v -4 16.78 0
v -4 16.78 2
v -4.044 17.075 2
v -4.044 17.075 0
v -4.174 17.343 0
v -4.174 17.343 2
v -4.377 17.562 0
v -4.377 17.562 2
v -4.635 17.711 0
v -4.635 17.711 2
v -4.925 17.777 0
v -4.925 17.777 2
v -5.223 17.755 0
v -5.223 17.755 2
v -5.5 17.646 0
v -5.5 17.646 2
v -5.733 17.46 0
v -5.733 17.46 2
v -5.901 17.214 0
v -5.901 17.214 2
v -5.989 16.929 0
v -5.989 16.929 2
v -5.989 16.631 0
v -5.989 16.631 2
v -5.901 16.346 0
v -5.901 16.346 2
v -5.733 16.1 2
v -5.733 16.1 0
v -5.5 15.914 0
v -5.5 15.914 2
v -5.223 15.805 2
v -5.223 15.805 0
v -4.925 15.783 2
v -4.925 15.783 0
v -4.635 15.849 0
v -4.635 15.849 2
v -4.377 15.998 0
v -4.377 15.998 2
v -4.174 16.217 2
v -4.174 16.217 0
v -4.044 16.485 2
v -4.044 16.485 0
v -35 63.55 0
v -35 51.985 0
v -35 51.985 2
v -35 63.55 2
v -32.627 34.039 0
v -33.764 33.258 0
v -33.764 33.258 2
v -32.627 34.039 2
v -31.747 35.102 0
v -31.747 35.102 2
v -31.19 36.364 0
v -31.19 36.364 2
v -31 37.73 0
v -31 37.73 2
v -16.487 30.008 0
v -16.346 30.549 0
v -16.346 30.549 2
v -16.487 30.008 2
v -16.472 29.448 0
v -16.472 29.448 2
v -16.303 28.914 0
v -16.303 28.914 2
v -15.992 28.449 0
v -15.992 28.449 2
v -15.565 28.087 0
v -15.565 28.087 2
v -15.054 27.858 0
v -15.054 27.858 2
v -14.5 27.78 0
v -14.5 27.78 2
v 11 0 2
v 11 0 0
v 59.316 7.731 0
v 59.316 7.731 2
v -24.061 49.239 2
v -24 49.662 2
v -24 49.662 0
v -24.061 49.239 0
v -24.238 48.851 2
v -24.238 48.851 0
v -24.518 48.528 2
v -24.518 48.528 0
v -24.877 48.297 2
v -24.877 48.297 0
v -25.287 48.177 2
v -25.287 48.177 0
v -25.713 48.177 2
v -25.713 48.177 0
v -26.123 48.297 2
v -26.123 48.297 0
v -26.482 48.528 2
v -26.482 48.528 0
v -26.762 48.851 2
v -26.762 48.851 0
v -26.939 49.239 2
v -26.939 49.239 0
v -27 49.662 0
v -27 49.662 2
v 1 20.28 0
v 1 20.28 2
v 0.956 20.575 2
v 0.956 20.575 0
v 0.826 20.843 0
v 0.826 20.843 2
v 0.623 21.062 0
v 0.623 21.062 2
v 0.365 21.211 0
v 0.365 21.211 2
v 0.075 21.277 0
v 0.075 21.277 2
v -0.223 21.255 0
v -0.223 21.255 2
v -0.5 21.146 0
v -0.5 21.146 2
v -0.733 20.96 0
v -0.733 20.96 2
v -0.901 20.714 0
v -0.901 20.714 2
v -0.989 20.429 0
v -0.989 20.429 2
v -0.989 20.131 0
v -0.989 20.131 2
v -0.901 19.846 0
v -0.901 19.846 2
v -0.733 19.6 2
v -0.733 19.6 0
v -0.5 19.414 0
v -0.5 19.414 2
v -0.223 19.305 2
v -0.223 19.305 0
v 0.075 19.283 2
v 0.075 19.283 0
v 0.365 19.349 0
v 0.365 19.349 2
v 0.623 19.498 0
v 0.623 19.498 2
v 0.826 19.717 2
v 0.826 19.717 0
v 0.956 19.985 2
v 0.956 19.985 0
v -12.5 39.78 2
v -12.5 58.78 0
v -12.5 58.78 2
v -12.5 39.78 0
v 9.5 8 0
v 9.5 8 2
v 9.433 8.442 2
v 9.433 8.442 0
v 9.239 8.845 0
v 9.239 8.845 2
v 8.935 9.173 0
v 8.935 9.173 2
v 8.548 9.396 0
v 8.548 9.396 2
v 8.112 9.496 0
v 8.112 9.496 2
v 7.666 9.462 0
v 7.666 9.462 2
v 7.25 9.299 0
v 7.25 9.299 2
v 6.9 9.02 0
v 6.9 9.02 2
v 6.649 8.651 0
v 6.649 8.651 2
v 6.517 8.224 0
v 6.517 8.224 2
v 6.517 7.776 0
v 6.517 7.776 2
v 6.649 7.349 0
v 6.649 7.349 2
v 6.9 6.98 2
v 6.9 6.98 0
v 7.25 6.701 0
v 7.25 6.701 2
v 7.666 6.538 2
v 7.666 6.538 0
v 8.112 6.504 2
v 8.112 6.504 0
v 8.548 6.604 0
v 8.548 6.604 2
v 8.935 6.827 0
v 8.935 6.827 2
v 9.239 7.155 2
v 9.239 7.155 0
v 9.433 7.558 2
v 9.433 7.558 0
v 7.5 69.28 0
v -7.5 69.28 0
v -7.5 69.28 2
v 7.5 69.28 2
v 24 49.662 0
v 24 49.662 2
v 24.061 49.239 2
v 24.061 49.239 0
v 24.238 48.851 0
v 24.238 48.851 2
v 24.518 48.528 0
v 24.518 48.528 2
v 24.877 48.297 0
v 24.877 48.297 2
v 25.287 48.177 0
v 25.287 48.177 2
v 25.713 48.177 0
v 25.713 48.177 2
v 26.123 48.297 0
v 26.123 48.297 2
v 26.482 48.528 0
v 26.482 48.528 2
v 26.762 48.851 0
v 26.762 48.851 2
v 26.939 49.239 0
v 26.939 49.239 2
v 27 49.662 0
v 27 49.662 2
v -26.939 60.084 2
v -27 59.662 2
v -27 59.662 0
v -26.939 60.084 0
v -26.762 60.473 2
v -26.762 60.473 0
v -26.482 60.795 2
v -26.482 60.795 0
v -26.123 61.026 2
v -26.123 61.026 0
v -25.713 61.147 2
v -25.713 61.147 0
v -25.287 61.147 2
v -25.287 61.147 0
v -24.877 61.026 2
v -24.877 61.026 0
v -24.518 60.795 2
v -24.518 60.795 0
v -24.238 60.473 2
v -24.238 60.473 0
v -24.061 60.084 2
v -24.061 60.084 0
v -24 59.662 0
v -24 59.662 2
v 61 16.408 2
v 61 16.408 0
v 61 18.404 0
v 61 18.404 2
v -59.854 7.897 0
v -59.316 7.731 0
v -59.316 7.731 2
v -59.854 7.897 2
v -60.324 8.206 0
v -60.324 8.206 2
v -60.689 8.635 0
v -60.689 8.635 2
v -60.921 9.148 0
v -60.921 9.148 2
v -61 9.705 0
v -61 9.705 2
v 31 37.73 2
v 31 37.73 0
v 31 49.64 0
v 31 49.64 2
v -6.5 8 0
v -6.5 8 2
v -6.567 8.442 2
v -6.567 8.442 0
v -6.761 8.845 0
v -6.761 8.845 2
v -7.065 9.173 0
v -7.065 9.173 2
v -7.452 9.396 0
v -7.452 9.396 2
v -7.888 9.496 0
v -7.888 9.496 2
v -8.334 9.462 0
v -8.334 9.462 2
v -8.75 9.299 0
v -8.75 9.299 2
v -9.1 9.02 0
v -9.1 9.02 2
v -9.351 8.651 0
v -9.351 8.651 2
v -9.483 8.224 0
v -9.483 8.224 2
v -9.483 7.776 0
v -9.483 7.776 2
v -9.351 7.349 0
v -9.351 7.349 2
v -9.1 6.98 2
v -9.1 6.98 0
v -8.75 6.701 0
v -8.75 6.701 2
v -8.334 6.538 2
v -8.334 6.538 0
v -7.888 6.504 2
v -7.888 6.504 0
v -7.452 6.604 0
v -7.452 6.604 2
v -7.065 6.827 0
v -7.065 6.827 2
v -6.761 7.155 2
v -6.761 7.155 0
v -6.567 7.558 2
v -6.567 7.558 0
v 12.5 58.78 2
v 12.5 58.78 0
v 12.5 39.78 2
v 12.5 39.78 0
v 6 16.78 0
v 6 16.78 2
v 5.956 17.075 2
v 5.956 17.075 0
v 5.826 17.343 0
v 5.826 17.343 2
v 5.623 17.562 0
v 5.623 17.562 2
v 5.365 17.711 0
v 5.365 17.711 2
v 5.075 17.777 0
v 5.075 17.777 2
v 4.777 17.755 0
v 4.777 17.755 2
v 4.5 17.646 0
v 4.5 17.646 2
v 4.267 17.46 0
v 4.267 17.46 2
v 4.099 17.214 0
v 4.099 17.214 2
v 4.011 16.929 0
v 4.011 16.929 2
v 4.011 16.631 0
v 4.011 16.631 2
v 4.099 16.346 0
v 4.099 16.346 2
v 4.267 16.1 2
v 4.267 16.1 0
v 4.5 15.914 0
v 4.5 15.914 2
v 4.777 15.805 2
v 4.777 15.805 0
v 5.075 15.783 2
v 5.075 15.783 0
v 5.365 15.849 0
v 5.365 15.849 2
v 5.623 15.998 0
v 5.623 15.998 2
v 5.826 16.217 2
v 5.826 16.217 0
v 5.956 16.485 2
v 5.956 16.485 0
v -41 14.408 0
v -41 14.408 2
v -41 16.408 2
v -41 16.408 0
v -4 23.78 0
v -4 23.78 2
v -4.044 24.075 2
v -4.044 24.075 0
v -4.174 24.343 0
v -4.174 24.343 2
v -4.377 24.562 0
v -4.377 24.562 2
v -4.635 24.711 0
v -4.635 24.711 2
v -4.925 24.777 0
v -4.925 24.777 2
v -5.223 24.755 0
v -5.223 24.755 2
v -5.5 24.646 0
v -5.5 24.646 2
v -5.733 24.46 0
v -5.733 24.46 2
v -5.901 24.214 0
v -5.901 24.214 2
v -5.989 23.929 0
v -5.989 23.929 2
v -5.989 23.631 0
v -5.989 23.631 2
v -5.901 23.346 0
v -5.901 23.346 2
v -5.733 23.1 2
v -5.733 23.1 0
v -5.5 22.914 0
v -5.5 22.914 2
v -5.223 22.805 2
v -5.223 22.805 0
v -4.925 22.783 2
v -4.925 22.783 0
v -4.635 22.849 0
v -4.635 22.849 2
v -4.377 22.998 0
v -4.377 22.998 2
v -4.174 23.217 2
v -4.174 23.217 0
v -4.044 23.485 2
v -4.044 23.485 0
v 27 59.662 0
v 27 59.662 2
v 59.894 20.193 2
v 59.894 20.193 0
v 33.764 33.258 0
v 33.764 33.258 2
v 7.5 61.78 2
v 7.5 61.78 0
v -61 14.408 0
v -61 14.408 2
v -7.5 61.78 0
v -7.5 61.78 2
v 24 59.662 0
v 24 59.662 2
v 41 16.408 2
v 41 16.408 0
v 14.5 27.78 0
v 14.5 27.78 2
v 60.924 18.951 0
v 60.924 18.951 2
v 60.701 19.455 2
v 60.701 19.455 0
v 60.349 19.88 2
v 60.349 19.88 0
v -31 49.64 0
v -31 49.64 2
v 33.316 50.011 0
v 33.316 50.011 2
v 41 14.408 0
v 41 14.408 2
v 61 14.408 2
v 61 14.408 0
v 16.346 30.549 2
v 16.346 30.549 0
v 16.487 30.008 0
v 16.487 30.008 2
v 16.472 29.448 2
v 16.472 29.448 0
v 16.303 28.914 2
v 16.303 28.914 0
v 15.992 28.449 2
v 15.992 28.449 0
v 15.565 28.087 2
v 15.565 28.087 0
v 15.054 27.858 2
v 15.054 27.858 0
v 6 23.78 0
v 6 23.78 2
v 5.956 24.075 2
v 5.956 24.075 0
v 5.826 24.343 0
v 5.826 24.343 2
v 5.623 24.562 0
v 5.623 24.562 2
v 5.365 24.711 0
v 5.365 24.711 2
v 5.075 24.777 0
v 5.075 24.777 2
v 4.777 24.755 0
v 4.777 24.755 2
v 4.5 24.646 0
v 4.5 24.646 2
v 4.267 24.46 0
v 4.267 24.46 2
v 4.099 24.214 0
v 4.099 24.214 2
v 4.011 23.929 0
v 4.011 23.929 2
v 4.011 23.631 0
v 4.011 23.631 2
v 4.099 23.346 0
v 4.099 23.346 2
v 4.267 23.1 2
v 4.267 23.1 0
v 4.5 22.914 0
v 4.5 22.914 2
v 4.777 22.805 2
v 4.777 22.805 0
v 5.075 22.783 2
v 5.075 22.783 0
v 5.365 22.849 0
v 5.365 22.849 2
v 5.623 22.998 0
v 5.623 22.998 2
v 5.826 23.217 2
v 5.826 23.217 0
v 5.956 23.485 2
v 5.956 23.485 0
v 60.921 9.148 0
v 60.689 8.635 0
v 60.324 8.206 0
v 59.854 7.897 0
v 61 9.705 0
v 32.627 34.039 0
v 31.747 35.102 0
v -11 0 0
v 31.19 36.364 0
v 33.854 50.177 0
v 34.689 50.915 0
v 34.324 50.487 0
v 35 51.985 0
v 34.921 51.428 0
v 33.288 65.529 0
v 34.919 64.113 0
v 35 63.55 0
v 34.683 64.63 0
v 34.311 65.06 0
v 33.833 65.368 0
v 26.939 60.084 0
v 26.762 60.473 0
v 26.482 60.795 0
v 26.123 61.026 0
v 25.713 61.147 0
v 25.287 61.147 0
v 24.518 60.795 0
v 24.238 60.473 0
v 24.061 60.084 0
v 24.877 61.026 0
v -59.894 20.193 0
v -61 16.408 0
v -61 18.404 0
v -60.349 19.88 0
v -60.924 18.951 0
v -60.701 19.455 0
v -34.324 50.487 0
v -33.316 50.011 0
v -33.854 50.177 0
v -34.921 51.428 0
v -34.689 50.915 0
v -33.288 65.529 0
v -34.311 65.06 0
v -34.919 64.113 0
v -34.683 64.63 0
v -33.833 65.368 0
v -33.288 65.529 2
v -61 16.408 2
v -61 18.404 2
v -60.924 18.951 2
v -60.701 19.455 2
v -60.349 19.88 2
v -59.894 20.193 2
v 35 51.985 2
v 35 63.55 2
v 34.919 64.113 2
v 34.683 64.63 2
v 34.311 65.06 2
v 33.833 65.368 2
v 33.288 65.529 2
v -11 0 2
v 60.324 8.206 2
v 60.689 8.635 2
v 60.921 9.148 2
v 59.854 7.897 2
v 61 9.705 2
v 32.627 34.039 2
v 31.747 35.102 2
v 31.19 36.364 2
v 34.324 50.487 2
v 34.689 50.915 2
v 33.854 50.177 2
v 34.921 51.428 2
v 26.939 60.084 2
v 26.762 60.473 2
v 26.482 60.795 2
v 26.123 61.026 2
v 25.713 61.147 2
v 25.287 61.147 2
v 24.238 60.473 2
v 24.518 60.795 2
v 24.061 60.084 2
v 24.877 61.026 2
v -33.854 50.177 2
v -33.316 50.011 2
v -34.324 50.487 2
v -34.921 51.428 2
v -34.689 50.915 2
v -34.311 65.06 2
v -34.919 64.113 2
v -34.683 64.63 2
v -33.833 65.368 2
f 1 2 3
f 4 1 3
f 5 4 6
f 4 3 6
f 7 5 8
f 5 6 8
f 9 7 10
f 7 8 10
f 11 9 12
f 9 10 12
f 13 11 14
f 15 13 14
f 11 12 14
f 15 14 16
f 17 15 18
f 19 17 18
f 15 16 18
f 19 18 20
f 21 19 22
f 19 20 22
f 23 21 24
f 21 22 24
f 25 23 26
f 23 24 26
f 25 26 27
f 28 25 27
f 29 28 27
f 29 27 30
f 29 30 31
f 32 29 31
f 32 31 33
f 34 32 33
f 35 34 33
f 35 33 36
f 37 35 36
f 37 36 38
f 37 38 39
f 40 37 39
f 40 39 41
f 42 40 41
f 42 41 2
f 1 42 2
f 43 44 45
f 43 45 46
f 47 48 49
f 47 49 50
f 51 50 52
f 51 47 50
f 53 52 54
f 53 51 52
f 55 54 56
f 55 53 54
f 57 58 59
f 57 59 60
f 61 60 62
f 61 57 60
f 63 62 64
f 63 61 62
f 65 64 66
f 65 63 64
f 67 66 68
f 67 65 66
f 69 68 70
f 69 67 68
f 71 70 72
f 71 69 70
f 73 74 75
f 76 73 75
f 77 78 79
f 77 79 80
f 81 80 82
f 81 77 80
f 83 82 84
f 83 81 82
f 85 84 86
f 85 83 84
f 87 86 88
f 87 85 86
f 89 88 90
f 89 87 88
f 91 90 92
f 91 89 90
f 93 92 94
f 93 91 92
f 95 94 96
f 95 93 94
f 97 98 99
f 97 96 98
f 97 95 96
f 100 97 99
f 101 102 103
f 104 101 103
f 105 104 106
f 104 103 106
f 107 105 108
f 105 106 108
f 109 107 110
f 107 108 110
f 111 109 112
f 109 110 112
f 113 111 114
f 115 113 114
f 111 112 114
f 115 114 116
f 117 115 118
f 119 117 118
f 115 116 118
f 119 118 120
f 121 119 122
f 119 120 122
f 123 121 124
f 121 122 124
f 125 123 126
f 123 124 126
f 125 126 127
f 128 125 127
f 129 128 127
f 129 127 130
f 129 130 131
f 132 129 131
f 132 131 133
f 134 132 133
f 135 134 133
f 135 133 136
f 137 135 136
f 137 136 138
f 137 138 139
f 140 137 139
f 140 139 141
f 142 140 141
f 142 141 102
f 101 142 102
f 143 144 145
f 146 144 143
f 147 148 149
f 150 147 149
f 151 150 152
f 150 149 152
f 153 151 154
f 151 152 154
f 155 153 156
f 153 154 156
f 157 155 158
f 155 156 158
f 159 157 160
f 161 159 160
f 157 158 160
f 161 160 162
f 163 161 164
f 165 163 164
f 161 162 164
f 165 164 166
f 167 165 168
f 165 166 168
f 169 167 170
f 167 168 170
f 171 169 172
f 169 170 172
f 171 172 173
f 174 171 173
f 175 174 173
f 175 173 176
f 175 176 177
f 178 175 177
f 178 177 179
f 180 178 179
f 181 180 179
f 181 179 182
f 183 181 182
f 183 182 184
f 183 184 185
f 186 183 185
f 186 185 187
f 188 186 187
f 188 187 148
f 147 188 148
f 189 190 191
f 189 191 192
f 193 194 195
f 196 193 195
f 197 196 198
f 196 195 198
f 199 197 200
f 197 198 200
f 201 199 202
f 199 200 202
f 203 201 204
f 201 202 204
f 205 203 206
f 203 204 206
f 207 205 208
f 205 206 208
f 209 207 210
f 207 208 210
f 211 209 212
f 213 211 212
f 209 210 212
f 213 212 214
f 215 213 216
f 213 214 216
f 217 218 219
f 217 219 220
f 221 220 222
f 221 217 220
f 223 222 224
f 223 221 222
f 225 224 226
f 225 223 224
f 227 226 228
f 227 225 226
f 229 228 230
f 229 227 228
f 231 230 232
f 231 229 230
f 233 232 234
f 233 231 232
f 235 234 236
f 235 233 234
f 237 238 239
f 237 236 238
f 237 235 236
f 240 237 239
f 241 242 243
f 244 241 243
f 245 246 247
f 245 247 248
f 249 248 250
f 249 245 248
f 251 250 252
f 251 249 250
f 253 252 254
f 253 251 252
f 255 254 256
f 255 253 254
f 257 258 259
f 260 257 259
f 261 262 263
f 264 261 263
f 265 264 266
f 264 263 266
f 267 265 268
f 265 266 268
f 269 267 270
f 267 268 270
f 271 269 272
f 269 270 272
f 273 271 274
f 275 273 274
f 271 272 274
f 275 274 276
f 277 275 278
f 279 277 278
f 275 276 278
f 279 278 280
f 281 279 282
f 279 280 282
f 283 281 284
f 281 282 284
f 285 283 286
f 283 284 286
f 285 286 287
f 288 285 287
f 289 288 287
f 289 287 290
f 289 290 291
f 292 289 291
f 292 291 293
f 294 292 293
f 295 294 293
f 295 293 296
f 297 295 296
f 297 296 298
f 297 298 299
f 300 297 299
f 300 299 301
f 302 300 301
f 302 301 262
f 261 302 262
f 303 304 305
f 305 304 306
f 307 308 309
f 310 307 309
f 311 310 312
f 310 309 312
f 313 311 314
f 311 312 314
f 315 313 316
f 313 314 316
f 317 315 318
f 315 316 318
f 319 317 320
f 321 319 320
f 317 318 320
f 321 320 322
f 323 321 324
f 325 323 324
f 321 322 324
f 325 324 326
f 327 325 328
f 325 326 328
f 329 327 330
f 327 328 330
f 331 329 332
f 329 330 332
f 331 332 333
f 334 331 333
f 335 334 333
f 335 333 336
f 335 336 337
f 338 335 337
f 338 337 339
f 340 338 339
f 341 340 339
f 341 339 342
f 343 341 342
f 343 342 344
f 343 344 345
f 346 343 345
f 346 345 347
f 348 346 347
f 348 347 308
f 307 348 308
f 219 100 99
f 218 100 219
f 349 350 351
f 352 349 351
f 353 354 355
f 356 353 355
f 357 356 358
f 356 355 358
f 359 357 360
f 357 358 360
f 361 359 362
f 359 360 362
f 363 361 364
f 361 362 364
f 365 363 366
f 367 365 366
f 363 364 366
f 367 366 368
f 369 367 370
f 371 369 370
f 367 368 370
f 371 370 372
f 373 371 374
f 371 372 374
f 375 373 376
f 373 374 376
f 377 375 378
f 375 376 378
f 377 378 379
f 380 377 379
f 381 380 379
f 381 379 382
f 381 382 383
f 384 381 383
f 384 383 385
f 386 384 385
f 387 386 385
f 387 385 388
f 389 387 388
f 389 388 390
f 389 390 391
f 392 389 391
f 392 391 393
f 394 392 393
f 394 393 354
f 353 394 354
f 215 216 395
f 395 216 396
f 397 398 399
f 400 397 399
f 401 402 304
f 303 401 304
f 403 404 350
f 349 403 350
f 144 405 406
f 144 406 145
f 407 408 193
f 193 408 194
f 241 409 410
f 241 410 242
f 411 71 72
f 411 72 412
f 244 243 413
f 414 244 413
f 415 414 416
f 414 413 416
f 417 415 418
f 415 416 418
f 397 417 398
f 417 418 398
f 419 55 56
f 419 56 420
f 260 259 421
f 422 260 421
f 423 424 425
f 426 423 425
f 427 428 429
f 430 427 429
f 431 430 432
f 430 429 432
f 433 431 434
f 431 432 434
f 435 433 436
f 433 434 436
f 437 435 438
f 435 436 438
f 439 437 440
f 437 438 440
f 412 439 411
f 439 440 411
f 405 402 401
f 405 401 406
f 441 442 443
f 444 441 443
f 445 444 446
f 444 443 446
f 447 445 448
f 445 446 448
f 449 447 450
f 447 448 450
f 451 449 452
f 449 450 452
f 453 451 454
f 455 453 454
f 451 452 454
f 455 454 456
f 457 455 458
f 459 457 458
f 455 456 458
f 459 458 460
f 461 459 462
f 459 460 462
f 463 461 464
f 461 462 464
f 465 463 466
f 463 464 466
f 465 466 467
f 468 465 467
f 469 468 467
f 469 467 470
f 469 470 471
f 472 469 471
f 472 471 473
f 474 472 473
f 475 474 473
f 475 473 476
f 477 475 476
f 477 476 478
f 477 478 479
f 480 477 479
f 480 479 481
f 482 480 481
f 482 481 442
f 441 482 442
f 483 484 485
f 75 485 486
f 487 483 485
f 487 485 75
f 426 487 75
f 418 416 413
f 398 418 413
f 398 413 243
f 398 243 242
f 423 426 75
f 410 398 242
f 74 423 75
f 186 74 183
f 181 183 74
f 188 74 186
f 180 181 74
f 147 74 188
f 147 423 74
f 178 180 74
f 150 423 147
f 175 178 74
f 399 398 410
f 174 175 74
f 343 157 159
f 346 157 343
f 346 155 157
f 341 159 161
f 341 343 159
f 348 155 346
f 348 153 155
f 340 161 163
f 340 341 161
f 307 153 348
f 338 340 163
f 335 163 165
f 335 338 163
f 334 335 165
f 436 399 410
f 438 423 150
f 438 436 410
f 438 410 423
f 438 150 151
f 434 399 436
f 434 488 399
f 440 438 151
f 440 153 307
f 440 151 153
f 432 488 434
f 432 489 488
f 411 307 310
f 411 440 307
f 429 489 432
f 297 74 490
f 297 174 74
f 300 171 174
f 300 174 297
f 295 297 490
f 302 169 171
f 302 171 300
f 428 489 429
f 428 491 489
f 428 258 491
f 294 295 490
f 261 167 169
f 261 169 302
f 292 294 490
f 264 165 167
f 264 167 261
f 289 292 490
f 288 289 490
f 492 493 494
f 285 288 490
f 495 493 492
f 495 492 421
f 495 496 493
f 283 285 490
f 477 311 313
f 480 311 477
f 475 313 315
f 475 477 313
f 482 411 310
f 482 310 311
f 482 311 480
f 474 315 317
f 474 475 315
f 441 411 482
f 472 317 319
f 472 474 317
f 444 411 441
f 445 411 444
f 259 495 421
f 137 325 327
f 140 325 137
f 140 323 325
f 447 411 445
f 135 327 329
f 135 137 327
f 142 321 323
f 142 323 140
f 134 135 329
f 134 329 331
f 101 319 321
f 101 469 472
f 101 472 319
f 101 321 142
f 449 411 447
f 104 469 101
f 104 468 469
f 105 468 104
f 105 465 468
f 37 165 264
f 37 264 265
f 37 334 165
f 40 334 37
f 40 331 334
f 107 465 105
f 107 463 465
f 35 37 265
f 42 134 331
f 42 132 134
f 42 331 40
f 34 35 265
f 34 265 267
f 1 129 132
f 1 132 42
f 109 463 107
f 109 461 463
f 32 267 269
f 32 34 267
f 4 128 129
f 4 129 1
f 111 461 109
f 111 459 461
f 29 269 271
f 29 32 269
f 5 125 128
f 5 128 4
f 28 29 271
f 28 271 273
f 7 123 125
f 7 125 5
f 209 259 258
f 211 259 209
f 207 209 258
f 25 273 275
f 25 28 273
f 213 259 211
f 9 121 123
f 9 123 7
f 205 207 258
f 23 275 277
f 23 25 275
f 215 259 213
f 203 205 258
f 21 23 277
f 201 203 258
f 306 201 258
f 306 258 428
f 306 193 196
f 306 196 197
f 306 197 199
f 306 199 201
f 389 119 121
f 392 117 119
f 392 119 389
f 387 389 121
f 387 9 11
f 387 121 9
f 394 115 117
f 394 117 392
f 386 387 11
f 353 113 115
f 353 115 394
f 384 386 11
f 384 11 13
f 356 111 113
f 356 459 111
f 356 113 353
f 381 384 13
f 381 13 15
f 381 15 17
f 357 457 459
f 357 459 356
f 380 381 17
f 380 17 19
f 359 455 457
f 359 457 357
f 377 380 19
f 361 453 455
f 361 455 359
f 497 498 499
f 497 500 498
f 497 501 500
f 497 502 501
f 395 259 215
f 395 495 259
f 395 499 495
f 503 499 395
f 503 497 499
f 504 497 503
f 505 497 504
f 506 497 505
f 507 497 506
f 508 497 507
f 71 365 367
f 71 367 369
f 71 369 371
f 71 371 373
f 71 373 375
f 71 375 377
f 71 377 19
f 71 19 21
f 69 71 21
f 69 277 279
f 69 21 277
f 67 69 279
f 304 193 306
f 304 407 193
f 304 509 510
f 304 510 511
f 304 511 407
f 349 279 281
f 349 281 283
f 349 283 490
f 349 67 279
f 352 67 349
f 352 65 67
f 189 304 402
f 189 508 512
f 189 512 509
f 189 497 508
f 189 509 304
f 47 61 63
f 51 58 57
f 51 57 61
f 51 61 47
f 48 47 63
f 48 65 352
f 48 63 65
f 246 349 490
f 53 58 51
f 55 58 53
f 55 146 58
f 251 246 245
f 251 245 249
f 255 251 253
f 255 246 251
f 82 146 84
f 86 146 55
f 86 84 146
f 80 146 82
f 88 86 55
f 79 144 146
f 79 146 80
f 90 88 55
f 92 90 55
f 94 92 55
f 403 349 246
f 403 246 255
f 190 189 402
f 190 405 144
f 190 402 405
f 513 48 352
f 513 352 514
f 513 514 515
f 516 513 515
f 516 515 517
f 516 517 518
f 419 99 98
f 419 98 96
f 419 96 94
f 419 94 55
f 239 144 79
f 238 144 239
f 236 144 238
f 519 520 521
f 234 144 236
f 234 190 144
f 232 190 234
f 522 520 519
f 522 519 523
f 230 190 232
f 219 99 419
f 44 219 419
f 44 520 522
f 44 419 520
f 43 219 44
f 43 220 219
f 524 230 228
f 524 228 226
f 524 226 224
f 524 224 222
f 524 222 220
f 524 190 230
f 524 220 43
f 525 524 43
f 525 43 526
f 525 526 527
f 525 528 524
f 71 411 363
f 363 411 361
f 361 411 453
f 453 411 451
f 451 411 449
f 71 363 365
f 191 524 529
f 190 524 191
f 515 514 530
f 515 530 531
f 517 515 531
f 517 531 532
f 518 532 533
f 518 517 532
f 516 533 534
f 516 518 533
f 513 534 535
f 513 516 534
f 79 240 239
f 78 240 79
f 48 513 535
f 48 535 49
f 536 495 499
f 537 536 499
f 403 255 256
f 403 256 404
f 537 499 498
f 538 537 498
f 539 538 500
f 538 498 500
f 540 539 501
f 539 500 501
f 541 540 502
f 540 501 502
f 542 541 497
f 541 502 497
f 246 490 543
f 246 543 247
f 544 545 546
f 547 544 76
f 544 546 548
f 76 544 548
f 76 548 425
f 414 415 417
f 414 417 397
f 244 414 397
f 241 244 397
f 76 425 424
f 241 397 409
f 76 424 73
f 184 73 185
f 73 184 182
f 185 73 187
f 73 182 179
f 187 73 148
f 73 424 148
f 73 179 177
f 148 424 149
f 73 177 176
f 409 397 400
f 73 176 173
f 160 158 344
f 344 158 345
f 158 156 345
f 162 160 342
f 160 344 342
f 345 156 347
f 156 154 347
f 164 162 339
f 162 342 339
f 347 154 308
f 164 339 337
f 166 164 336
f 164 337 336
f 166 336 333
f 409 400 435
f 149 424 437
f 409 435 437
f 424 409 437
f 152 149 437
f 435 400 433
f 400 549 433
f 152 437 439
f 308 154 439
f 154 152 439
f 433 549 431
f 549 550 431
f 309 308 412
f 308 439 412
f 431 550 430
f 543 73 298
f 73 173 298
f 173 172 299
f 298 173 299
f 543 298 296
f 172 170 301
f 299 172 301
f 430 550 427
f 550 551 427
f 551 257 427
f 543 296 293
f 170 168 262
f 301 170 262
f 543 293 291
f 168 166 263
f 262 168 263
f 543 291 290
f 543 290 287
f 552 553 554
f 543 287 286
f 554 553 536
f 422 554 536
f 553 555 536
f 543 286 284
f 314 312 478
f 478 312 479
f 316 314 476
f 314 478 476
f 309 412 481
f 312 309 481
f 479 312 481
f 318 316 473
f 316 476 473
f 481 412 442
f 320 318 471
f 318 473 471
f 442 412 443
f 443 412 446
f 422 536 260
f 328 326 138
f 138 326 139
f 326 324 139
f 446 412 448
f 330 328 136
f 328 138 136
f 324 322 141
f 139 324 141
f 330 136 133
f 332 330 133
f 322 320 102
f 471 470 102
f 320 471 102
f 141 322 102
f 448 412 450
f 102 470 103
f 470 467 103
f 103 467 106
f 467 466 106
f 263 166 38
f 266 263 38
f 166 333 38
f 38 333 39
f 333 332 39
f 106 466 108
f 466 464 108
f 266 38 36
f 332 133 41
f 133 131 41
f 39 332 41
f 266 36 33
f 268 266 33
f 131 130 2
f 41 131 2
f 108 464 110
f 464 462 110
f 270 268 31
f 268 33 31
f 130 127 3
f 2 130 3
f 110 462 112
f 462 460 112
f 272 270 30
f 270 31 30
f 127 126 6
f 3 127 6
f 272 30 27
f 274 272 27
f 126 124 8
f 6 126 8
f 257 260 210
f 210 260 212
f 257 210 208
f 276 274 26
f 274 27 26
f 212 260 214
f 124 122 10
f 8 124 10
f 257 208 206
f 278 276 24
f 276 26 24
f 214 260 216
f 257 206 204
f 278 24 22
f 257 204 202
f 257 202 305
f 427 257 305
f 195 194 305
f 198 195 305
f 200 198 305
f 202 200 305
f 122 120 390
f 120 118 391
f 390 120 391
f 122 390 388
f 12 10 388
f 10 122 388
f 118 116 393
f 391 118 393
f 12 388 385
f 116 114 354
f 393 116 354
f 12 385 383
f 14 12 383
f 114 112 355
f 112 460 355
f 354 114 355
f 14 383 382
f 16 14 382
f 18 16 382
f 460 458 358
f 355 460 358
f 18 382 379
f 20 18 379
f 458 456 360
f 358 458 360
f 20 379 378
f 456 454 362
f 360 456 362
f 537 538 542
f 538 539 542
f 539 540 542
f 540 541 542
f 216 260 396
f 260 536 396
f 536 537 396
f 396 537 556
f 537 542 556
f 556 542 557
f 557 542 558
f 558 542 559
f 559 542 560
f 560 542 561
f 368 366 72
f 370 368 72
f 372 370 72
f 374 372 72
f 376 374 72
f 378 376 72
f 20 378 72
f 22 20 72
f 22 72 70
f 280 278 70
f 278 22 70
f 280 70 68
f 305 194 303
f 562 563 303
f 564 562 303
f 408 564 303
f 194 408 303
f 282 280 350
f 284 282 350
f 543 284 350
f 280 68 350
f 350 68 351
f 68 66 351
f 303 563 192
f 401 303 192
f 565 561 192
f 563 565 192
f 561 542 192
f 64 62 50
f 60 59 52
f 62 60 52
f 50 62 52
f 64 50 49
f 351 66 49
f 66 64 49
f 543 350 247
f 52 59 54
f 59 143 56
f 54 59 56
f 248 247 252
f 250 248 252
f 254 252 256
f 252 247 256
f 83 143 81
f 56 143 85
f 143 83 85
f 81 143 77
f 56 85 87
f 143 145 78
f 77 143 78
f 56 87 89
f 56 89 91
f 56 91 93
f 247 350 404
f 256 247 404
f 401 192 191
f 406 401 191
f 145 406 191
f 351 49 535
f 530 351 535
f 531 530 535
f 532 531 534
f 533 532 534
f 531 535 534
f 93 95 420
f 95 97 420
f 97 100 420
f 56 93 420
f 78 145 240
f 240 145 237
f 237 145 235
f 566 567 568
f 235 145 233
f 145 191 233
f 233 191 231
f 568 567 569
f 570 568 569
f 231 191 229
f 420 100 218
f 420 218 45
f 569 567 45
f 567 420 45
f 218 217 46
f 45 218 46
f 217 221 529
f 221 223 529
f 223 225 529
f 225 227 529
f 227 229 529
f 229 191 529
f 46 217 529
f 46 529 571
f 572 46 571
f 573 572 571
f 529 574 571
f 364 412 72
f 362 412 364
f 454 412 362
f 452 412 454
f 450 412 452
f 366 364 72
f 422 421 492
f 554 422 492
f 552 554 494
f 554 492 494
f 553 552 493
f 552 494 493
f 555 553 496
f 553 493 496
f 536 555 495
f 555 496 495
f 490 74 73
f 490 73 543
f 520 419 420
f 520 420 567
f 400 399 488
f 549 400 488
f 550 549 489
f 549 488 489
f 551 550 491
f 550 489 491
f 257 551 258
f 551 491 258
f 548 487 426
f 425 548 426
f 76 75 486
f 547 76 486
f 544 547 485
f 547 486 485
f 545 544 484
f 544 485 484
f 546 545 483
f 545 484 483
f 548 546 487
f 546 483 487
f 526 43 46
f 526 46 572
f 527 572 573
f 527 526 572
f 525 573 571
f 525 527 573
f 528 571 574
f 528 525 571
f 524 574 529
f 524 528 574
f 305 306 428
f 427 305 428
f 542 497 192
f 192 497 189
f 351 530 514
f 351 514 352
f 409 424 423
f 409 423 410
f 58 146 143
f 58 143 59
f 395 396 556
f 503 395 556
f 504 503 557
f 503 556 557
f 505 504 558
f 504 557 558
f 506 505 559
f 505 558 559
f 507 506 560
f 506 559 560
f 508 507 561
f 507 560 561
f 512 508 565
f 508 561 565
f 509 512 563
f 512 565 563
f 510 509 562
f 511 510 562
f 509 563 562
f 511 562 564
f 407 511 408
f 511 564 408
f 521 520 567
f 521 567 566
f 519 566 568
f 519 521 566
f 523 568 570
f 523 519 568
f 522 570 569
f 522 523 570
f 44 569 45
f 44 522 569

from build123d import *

# Parameters (mm, degrees)
RESSALTO_EXTRUS_O1_DEPTH = 2
ESBO_O2_R                = 1
ESBO_O2_R_2              = 1.5
ESBO_O2_W                = 20
ESBO_O2_H                = 2
CORTE_EXTRUS_O1_DEPTH    = 3


with BuildPart() as part:
    # Esboço1 → Ressalto-extrusão1 (new body)
    with BuildSketch(Plane.XY):
        with BuildLine():
            Line((0, 0), (11, 0))
            Line((11, 0), (59.315981002, 7.73055696))
            ThreePointArc((59.315981002, 7.73055696), (60.521834749, 8.407740649), (61, 9.705438224))
            Line((61, 9.705438224), (61, 18.403988486))
            ThreePointArc((61, 18.403988486), (60.701301617, 19.45545071), (59.894427191, 20.192842868))
            Line((59.894427191, 20.192842868), (33.763932023, 33.258090452))
            ThreePointArc((33.763932023, 33.258090452), (31.746745958, 35.101570847), (31, 37.730226407))
            Line((31, 37.730226407), (31, 49.640056464))
            Line((31, 49.640056464), (33.315981002, 50.010613424))
            ThreePointArc((33.315981002, 50.010613424), (34.521834749, 50.687797112), (35, 51.985494688))
            Line((35, 51.985494688), (35, 63.549919266))
            ThreePointArc((35, 63.549919266), (34.512573863, 64.858399418), (33.287879691, 65.529092145))
            Line((33.287879691, 65.529092145), (7.5, 69.280056464))
            Line((7.5, 69.280056464), (0, 69.280056464))
            Line((0, 69.280056464), (0, 61.780056464))
            Line((0, 61.780056464), (7.5, 61.780056464))
            Line((7.5, 61.780056464), (12.5, 58.780056464))
            Line((12.5, 58.780056464), (12.5, 39.780056464))
            Line((12.5, 39.780056464), (16.346153846, 30.549287233))
            ThreePointArc((16.346153846, 30.549287233), (16.164100589, 28.670656071), (14.5, 27.780056464))
            Line((14.5, 27.780056464), (0, 27.780056464))
            Line((0, 27.780056464), (0, 0))
        make_face()
    ressalto_extrus_o1 = extrude(amount=RESSALTO_EXTRUS_O1_DEPTH)

    # Espelhar1: Ressalto-extrusão1 across plane
    add(ressalto_extrus_o1.mirror(Plane(origin=(0, 0, 0), x_dir=(0, 0, 1), z_dir=(1, 0, 0))))

    # Esboço2 → Corte-extrusão1 (cut, through all)
    with BuildSketch(Plane.XY.offset(2)):
        with Locations((-5, 23.780056464)):
            Circle(ESBO_O2_R)
        with Locations((5, 23.780056464)):
            Circle(ESBO_O2_R)
        with Locations((5, 16.780056464)):
            Circle(ESBO_O2_R)
        with Locations((-5, 16.780056464)):
            Circle(ESBO_O2_R)
        with Locations((0, 20.280056464)):
            Circle(ESBO_O2_R)
        with Locations((-8, 8)):
            Circle(ESBO_O2_R_2)
        with Locations((8, 8)):
            Circle(ESBO_O2_R_2)
        with BuildLine():
            Line((-24, 59.661874645), (-24, 49.661874645))
            ThreePointArc((-24, 49.661874645), (-25.5, 48.161874645), (-27, 49.661874645))
            Line((-27, 49.661874645), (-27, 59.661874645))
            ThreePointArc((-27, 59.661874645), (-25.5, 61.161874645), (-24, 59.661874645))
        make_face()
        with BuildLine():
            Line((24, 59.661874645), (24, 49.661874645))
            ThreePointArc((24, 49.661874645), (25.5, 48.161874645), (27, 49.661874645))
            Line((27, 49.661874645), (27, 59.661874645))
            ThreePointArc((27, 59.661874645), (25.5, 61.161874645), (24, 59.661874645))
        make_face()
        with Locations((-51, 15.407740649)):
            Rectangle(ESBO_O2_W, ESBO_O2_H)
        with Locations((51, 15.407740649)):
            Rectangle(ESBO_O2_W, ESBO_O2_H)
    extrude(amount=-CORTE_EXTRUS_O1_DEPTH, mode=Mode.SUBTRACT)


solid = part.part
